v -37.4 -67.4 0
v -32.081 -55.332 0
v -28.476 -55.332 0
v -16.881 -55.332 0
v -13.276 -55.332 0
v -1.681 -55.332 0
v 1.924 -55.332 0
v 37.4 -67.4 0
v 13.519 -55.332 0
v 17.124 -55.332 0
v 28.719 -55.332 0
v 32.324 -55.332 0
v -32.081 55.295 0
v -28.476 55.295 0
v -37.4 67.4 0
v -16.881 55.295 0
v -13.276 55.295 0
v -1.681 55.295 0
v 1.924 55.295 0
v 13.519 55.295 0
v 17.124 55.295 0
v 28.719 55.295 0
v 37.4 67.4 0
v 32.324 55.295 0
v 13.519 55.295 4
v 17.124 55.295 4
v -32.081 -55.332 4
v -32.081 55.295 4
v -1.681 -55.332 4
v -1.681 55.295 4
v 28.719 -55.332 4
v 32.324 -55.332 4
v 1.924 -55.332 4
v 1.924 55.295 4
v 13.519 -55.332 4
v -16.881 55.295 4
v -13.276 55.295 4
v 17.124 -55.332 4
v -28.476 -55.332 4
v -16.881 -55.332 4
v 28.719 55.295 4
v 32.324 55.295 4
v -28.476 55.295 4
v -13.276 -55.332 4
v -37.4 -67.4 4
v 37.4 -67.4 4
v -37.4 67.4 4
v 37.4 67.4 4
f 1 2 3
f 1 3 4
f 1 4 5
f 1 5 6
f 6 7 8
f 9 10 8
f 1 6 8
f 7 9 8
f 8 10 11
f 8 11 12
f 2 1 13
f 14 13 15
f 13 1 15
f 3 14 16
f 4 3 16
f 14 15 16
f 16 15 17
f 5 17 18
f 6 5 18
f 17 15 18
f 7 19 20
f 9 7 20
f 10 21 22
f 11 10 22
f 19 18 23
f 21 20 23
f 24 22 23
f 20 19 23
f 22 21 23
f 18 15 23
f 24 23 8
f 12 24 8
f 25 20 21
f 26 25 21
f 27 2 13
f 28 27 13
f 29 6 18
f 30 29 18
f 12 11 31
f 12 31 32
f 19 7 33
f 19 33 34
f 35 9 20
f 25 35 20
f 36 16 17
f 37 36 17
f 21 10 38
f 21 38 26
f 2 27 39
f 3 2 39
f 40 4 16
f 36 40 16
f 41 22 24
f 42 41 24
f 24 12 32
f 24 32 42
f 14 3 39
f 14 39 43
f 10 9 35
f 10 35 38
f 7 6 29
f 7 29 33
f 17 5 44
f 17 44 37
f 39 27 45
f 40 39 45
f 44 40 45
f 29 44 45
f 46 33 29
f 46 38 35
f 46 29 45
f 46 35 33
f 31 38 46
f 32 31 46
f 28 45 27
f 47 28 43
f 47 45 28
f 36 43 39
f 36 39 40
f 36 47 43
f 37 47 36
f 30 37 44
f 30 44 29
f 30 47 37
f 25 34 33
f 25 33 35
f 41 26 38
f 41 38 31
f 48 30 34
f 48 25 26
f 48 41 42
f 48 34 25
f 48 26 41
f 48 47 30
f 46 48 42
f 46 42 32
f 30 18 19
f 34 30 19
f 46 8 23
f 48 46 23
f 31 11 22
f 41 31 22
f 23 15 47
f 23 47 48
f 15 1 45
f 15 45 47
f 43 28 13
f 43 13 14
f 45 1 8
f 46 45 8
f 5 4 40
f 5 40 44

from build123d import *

# Parameters (mm, degrees)
F0_W     = 74.8
F0_H     = 134.8
F0_W_2   = 3.605619
F0_H_2   = 110.626959
F1_DEPTH = 4


with BuildPart() as f1:
    # F0 (on Top) → F1 (new body)
    with BuildSketch(Plane.XY):
        Rectangle(F0_W, F0_H)
        with Locations((-30.278574, -0.018355)):
            Rectangle(F0_W_2, F0_H_2, mode=Mode.SUBTRACT)
        with Locations((-15.078575, -0.018355)):
            Rectangle(F0_W_2, F0_H_2, mode=Mode.SUBTRACT)
        with Locations((0.121425, -0.018355)):
            Rectangle(F0_W_2, F0_H_2, mode=Mode.SUBTRACT)
        with Locations((15.321426, -0.018355)):
            Rectangle(F0_W_2, F0_H_2, mode=Mode.SUBTRACT)
        with Locations((30.521425, -0.018355)):
            Rectangle(F0_W_2, F0_H_2, mode=Mode.SUBTRACT)
    extrude(amount=F1_DEPTH)


solid = f1.part
